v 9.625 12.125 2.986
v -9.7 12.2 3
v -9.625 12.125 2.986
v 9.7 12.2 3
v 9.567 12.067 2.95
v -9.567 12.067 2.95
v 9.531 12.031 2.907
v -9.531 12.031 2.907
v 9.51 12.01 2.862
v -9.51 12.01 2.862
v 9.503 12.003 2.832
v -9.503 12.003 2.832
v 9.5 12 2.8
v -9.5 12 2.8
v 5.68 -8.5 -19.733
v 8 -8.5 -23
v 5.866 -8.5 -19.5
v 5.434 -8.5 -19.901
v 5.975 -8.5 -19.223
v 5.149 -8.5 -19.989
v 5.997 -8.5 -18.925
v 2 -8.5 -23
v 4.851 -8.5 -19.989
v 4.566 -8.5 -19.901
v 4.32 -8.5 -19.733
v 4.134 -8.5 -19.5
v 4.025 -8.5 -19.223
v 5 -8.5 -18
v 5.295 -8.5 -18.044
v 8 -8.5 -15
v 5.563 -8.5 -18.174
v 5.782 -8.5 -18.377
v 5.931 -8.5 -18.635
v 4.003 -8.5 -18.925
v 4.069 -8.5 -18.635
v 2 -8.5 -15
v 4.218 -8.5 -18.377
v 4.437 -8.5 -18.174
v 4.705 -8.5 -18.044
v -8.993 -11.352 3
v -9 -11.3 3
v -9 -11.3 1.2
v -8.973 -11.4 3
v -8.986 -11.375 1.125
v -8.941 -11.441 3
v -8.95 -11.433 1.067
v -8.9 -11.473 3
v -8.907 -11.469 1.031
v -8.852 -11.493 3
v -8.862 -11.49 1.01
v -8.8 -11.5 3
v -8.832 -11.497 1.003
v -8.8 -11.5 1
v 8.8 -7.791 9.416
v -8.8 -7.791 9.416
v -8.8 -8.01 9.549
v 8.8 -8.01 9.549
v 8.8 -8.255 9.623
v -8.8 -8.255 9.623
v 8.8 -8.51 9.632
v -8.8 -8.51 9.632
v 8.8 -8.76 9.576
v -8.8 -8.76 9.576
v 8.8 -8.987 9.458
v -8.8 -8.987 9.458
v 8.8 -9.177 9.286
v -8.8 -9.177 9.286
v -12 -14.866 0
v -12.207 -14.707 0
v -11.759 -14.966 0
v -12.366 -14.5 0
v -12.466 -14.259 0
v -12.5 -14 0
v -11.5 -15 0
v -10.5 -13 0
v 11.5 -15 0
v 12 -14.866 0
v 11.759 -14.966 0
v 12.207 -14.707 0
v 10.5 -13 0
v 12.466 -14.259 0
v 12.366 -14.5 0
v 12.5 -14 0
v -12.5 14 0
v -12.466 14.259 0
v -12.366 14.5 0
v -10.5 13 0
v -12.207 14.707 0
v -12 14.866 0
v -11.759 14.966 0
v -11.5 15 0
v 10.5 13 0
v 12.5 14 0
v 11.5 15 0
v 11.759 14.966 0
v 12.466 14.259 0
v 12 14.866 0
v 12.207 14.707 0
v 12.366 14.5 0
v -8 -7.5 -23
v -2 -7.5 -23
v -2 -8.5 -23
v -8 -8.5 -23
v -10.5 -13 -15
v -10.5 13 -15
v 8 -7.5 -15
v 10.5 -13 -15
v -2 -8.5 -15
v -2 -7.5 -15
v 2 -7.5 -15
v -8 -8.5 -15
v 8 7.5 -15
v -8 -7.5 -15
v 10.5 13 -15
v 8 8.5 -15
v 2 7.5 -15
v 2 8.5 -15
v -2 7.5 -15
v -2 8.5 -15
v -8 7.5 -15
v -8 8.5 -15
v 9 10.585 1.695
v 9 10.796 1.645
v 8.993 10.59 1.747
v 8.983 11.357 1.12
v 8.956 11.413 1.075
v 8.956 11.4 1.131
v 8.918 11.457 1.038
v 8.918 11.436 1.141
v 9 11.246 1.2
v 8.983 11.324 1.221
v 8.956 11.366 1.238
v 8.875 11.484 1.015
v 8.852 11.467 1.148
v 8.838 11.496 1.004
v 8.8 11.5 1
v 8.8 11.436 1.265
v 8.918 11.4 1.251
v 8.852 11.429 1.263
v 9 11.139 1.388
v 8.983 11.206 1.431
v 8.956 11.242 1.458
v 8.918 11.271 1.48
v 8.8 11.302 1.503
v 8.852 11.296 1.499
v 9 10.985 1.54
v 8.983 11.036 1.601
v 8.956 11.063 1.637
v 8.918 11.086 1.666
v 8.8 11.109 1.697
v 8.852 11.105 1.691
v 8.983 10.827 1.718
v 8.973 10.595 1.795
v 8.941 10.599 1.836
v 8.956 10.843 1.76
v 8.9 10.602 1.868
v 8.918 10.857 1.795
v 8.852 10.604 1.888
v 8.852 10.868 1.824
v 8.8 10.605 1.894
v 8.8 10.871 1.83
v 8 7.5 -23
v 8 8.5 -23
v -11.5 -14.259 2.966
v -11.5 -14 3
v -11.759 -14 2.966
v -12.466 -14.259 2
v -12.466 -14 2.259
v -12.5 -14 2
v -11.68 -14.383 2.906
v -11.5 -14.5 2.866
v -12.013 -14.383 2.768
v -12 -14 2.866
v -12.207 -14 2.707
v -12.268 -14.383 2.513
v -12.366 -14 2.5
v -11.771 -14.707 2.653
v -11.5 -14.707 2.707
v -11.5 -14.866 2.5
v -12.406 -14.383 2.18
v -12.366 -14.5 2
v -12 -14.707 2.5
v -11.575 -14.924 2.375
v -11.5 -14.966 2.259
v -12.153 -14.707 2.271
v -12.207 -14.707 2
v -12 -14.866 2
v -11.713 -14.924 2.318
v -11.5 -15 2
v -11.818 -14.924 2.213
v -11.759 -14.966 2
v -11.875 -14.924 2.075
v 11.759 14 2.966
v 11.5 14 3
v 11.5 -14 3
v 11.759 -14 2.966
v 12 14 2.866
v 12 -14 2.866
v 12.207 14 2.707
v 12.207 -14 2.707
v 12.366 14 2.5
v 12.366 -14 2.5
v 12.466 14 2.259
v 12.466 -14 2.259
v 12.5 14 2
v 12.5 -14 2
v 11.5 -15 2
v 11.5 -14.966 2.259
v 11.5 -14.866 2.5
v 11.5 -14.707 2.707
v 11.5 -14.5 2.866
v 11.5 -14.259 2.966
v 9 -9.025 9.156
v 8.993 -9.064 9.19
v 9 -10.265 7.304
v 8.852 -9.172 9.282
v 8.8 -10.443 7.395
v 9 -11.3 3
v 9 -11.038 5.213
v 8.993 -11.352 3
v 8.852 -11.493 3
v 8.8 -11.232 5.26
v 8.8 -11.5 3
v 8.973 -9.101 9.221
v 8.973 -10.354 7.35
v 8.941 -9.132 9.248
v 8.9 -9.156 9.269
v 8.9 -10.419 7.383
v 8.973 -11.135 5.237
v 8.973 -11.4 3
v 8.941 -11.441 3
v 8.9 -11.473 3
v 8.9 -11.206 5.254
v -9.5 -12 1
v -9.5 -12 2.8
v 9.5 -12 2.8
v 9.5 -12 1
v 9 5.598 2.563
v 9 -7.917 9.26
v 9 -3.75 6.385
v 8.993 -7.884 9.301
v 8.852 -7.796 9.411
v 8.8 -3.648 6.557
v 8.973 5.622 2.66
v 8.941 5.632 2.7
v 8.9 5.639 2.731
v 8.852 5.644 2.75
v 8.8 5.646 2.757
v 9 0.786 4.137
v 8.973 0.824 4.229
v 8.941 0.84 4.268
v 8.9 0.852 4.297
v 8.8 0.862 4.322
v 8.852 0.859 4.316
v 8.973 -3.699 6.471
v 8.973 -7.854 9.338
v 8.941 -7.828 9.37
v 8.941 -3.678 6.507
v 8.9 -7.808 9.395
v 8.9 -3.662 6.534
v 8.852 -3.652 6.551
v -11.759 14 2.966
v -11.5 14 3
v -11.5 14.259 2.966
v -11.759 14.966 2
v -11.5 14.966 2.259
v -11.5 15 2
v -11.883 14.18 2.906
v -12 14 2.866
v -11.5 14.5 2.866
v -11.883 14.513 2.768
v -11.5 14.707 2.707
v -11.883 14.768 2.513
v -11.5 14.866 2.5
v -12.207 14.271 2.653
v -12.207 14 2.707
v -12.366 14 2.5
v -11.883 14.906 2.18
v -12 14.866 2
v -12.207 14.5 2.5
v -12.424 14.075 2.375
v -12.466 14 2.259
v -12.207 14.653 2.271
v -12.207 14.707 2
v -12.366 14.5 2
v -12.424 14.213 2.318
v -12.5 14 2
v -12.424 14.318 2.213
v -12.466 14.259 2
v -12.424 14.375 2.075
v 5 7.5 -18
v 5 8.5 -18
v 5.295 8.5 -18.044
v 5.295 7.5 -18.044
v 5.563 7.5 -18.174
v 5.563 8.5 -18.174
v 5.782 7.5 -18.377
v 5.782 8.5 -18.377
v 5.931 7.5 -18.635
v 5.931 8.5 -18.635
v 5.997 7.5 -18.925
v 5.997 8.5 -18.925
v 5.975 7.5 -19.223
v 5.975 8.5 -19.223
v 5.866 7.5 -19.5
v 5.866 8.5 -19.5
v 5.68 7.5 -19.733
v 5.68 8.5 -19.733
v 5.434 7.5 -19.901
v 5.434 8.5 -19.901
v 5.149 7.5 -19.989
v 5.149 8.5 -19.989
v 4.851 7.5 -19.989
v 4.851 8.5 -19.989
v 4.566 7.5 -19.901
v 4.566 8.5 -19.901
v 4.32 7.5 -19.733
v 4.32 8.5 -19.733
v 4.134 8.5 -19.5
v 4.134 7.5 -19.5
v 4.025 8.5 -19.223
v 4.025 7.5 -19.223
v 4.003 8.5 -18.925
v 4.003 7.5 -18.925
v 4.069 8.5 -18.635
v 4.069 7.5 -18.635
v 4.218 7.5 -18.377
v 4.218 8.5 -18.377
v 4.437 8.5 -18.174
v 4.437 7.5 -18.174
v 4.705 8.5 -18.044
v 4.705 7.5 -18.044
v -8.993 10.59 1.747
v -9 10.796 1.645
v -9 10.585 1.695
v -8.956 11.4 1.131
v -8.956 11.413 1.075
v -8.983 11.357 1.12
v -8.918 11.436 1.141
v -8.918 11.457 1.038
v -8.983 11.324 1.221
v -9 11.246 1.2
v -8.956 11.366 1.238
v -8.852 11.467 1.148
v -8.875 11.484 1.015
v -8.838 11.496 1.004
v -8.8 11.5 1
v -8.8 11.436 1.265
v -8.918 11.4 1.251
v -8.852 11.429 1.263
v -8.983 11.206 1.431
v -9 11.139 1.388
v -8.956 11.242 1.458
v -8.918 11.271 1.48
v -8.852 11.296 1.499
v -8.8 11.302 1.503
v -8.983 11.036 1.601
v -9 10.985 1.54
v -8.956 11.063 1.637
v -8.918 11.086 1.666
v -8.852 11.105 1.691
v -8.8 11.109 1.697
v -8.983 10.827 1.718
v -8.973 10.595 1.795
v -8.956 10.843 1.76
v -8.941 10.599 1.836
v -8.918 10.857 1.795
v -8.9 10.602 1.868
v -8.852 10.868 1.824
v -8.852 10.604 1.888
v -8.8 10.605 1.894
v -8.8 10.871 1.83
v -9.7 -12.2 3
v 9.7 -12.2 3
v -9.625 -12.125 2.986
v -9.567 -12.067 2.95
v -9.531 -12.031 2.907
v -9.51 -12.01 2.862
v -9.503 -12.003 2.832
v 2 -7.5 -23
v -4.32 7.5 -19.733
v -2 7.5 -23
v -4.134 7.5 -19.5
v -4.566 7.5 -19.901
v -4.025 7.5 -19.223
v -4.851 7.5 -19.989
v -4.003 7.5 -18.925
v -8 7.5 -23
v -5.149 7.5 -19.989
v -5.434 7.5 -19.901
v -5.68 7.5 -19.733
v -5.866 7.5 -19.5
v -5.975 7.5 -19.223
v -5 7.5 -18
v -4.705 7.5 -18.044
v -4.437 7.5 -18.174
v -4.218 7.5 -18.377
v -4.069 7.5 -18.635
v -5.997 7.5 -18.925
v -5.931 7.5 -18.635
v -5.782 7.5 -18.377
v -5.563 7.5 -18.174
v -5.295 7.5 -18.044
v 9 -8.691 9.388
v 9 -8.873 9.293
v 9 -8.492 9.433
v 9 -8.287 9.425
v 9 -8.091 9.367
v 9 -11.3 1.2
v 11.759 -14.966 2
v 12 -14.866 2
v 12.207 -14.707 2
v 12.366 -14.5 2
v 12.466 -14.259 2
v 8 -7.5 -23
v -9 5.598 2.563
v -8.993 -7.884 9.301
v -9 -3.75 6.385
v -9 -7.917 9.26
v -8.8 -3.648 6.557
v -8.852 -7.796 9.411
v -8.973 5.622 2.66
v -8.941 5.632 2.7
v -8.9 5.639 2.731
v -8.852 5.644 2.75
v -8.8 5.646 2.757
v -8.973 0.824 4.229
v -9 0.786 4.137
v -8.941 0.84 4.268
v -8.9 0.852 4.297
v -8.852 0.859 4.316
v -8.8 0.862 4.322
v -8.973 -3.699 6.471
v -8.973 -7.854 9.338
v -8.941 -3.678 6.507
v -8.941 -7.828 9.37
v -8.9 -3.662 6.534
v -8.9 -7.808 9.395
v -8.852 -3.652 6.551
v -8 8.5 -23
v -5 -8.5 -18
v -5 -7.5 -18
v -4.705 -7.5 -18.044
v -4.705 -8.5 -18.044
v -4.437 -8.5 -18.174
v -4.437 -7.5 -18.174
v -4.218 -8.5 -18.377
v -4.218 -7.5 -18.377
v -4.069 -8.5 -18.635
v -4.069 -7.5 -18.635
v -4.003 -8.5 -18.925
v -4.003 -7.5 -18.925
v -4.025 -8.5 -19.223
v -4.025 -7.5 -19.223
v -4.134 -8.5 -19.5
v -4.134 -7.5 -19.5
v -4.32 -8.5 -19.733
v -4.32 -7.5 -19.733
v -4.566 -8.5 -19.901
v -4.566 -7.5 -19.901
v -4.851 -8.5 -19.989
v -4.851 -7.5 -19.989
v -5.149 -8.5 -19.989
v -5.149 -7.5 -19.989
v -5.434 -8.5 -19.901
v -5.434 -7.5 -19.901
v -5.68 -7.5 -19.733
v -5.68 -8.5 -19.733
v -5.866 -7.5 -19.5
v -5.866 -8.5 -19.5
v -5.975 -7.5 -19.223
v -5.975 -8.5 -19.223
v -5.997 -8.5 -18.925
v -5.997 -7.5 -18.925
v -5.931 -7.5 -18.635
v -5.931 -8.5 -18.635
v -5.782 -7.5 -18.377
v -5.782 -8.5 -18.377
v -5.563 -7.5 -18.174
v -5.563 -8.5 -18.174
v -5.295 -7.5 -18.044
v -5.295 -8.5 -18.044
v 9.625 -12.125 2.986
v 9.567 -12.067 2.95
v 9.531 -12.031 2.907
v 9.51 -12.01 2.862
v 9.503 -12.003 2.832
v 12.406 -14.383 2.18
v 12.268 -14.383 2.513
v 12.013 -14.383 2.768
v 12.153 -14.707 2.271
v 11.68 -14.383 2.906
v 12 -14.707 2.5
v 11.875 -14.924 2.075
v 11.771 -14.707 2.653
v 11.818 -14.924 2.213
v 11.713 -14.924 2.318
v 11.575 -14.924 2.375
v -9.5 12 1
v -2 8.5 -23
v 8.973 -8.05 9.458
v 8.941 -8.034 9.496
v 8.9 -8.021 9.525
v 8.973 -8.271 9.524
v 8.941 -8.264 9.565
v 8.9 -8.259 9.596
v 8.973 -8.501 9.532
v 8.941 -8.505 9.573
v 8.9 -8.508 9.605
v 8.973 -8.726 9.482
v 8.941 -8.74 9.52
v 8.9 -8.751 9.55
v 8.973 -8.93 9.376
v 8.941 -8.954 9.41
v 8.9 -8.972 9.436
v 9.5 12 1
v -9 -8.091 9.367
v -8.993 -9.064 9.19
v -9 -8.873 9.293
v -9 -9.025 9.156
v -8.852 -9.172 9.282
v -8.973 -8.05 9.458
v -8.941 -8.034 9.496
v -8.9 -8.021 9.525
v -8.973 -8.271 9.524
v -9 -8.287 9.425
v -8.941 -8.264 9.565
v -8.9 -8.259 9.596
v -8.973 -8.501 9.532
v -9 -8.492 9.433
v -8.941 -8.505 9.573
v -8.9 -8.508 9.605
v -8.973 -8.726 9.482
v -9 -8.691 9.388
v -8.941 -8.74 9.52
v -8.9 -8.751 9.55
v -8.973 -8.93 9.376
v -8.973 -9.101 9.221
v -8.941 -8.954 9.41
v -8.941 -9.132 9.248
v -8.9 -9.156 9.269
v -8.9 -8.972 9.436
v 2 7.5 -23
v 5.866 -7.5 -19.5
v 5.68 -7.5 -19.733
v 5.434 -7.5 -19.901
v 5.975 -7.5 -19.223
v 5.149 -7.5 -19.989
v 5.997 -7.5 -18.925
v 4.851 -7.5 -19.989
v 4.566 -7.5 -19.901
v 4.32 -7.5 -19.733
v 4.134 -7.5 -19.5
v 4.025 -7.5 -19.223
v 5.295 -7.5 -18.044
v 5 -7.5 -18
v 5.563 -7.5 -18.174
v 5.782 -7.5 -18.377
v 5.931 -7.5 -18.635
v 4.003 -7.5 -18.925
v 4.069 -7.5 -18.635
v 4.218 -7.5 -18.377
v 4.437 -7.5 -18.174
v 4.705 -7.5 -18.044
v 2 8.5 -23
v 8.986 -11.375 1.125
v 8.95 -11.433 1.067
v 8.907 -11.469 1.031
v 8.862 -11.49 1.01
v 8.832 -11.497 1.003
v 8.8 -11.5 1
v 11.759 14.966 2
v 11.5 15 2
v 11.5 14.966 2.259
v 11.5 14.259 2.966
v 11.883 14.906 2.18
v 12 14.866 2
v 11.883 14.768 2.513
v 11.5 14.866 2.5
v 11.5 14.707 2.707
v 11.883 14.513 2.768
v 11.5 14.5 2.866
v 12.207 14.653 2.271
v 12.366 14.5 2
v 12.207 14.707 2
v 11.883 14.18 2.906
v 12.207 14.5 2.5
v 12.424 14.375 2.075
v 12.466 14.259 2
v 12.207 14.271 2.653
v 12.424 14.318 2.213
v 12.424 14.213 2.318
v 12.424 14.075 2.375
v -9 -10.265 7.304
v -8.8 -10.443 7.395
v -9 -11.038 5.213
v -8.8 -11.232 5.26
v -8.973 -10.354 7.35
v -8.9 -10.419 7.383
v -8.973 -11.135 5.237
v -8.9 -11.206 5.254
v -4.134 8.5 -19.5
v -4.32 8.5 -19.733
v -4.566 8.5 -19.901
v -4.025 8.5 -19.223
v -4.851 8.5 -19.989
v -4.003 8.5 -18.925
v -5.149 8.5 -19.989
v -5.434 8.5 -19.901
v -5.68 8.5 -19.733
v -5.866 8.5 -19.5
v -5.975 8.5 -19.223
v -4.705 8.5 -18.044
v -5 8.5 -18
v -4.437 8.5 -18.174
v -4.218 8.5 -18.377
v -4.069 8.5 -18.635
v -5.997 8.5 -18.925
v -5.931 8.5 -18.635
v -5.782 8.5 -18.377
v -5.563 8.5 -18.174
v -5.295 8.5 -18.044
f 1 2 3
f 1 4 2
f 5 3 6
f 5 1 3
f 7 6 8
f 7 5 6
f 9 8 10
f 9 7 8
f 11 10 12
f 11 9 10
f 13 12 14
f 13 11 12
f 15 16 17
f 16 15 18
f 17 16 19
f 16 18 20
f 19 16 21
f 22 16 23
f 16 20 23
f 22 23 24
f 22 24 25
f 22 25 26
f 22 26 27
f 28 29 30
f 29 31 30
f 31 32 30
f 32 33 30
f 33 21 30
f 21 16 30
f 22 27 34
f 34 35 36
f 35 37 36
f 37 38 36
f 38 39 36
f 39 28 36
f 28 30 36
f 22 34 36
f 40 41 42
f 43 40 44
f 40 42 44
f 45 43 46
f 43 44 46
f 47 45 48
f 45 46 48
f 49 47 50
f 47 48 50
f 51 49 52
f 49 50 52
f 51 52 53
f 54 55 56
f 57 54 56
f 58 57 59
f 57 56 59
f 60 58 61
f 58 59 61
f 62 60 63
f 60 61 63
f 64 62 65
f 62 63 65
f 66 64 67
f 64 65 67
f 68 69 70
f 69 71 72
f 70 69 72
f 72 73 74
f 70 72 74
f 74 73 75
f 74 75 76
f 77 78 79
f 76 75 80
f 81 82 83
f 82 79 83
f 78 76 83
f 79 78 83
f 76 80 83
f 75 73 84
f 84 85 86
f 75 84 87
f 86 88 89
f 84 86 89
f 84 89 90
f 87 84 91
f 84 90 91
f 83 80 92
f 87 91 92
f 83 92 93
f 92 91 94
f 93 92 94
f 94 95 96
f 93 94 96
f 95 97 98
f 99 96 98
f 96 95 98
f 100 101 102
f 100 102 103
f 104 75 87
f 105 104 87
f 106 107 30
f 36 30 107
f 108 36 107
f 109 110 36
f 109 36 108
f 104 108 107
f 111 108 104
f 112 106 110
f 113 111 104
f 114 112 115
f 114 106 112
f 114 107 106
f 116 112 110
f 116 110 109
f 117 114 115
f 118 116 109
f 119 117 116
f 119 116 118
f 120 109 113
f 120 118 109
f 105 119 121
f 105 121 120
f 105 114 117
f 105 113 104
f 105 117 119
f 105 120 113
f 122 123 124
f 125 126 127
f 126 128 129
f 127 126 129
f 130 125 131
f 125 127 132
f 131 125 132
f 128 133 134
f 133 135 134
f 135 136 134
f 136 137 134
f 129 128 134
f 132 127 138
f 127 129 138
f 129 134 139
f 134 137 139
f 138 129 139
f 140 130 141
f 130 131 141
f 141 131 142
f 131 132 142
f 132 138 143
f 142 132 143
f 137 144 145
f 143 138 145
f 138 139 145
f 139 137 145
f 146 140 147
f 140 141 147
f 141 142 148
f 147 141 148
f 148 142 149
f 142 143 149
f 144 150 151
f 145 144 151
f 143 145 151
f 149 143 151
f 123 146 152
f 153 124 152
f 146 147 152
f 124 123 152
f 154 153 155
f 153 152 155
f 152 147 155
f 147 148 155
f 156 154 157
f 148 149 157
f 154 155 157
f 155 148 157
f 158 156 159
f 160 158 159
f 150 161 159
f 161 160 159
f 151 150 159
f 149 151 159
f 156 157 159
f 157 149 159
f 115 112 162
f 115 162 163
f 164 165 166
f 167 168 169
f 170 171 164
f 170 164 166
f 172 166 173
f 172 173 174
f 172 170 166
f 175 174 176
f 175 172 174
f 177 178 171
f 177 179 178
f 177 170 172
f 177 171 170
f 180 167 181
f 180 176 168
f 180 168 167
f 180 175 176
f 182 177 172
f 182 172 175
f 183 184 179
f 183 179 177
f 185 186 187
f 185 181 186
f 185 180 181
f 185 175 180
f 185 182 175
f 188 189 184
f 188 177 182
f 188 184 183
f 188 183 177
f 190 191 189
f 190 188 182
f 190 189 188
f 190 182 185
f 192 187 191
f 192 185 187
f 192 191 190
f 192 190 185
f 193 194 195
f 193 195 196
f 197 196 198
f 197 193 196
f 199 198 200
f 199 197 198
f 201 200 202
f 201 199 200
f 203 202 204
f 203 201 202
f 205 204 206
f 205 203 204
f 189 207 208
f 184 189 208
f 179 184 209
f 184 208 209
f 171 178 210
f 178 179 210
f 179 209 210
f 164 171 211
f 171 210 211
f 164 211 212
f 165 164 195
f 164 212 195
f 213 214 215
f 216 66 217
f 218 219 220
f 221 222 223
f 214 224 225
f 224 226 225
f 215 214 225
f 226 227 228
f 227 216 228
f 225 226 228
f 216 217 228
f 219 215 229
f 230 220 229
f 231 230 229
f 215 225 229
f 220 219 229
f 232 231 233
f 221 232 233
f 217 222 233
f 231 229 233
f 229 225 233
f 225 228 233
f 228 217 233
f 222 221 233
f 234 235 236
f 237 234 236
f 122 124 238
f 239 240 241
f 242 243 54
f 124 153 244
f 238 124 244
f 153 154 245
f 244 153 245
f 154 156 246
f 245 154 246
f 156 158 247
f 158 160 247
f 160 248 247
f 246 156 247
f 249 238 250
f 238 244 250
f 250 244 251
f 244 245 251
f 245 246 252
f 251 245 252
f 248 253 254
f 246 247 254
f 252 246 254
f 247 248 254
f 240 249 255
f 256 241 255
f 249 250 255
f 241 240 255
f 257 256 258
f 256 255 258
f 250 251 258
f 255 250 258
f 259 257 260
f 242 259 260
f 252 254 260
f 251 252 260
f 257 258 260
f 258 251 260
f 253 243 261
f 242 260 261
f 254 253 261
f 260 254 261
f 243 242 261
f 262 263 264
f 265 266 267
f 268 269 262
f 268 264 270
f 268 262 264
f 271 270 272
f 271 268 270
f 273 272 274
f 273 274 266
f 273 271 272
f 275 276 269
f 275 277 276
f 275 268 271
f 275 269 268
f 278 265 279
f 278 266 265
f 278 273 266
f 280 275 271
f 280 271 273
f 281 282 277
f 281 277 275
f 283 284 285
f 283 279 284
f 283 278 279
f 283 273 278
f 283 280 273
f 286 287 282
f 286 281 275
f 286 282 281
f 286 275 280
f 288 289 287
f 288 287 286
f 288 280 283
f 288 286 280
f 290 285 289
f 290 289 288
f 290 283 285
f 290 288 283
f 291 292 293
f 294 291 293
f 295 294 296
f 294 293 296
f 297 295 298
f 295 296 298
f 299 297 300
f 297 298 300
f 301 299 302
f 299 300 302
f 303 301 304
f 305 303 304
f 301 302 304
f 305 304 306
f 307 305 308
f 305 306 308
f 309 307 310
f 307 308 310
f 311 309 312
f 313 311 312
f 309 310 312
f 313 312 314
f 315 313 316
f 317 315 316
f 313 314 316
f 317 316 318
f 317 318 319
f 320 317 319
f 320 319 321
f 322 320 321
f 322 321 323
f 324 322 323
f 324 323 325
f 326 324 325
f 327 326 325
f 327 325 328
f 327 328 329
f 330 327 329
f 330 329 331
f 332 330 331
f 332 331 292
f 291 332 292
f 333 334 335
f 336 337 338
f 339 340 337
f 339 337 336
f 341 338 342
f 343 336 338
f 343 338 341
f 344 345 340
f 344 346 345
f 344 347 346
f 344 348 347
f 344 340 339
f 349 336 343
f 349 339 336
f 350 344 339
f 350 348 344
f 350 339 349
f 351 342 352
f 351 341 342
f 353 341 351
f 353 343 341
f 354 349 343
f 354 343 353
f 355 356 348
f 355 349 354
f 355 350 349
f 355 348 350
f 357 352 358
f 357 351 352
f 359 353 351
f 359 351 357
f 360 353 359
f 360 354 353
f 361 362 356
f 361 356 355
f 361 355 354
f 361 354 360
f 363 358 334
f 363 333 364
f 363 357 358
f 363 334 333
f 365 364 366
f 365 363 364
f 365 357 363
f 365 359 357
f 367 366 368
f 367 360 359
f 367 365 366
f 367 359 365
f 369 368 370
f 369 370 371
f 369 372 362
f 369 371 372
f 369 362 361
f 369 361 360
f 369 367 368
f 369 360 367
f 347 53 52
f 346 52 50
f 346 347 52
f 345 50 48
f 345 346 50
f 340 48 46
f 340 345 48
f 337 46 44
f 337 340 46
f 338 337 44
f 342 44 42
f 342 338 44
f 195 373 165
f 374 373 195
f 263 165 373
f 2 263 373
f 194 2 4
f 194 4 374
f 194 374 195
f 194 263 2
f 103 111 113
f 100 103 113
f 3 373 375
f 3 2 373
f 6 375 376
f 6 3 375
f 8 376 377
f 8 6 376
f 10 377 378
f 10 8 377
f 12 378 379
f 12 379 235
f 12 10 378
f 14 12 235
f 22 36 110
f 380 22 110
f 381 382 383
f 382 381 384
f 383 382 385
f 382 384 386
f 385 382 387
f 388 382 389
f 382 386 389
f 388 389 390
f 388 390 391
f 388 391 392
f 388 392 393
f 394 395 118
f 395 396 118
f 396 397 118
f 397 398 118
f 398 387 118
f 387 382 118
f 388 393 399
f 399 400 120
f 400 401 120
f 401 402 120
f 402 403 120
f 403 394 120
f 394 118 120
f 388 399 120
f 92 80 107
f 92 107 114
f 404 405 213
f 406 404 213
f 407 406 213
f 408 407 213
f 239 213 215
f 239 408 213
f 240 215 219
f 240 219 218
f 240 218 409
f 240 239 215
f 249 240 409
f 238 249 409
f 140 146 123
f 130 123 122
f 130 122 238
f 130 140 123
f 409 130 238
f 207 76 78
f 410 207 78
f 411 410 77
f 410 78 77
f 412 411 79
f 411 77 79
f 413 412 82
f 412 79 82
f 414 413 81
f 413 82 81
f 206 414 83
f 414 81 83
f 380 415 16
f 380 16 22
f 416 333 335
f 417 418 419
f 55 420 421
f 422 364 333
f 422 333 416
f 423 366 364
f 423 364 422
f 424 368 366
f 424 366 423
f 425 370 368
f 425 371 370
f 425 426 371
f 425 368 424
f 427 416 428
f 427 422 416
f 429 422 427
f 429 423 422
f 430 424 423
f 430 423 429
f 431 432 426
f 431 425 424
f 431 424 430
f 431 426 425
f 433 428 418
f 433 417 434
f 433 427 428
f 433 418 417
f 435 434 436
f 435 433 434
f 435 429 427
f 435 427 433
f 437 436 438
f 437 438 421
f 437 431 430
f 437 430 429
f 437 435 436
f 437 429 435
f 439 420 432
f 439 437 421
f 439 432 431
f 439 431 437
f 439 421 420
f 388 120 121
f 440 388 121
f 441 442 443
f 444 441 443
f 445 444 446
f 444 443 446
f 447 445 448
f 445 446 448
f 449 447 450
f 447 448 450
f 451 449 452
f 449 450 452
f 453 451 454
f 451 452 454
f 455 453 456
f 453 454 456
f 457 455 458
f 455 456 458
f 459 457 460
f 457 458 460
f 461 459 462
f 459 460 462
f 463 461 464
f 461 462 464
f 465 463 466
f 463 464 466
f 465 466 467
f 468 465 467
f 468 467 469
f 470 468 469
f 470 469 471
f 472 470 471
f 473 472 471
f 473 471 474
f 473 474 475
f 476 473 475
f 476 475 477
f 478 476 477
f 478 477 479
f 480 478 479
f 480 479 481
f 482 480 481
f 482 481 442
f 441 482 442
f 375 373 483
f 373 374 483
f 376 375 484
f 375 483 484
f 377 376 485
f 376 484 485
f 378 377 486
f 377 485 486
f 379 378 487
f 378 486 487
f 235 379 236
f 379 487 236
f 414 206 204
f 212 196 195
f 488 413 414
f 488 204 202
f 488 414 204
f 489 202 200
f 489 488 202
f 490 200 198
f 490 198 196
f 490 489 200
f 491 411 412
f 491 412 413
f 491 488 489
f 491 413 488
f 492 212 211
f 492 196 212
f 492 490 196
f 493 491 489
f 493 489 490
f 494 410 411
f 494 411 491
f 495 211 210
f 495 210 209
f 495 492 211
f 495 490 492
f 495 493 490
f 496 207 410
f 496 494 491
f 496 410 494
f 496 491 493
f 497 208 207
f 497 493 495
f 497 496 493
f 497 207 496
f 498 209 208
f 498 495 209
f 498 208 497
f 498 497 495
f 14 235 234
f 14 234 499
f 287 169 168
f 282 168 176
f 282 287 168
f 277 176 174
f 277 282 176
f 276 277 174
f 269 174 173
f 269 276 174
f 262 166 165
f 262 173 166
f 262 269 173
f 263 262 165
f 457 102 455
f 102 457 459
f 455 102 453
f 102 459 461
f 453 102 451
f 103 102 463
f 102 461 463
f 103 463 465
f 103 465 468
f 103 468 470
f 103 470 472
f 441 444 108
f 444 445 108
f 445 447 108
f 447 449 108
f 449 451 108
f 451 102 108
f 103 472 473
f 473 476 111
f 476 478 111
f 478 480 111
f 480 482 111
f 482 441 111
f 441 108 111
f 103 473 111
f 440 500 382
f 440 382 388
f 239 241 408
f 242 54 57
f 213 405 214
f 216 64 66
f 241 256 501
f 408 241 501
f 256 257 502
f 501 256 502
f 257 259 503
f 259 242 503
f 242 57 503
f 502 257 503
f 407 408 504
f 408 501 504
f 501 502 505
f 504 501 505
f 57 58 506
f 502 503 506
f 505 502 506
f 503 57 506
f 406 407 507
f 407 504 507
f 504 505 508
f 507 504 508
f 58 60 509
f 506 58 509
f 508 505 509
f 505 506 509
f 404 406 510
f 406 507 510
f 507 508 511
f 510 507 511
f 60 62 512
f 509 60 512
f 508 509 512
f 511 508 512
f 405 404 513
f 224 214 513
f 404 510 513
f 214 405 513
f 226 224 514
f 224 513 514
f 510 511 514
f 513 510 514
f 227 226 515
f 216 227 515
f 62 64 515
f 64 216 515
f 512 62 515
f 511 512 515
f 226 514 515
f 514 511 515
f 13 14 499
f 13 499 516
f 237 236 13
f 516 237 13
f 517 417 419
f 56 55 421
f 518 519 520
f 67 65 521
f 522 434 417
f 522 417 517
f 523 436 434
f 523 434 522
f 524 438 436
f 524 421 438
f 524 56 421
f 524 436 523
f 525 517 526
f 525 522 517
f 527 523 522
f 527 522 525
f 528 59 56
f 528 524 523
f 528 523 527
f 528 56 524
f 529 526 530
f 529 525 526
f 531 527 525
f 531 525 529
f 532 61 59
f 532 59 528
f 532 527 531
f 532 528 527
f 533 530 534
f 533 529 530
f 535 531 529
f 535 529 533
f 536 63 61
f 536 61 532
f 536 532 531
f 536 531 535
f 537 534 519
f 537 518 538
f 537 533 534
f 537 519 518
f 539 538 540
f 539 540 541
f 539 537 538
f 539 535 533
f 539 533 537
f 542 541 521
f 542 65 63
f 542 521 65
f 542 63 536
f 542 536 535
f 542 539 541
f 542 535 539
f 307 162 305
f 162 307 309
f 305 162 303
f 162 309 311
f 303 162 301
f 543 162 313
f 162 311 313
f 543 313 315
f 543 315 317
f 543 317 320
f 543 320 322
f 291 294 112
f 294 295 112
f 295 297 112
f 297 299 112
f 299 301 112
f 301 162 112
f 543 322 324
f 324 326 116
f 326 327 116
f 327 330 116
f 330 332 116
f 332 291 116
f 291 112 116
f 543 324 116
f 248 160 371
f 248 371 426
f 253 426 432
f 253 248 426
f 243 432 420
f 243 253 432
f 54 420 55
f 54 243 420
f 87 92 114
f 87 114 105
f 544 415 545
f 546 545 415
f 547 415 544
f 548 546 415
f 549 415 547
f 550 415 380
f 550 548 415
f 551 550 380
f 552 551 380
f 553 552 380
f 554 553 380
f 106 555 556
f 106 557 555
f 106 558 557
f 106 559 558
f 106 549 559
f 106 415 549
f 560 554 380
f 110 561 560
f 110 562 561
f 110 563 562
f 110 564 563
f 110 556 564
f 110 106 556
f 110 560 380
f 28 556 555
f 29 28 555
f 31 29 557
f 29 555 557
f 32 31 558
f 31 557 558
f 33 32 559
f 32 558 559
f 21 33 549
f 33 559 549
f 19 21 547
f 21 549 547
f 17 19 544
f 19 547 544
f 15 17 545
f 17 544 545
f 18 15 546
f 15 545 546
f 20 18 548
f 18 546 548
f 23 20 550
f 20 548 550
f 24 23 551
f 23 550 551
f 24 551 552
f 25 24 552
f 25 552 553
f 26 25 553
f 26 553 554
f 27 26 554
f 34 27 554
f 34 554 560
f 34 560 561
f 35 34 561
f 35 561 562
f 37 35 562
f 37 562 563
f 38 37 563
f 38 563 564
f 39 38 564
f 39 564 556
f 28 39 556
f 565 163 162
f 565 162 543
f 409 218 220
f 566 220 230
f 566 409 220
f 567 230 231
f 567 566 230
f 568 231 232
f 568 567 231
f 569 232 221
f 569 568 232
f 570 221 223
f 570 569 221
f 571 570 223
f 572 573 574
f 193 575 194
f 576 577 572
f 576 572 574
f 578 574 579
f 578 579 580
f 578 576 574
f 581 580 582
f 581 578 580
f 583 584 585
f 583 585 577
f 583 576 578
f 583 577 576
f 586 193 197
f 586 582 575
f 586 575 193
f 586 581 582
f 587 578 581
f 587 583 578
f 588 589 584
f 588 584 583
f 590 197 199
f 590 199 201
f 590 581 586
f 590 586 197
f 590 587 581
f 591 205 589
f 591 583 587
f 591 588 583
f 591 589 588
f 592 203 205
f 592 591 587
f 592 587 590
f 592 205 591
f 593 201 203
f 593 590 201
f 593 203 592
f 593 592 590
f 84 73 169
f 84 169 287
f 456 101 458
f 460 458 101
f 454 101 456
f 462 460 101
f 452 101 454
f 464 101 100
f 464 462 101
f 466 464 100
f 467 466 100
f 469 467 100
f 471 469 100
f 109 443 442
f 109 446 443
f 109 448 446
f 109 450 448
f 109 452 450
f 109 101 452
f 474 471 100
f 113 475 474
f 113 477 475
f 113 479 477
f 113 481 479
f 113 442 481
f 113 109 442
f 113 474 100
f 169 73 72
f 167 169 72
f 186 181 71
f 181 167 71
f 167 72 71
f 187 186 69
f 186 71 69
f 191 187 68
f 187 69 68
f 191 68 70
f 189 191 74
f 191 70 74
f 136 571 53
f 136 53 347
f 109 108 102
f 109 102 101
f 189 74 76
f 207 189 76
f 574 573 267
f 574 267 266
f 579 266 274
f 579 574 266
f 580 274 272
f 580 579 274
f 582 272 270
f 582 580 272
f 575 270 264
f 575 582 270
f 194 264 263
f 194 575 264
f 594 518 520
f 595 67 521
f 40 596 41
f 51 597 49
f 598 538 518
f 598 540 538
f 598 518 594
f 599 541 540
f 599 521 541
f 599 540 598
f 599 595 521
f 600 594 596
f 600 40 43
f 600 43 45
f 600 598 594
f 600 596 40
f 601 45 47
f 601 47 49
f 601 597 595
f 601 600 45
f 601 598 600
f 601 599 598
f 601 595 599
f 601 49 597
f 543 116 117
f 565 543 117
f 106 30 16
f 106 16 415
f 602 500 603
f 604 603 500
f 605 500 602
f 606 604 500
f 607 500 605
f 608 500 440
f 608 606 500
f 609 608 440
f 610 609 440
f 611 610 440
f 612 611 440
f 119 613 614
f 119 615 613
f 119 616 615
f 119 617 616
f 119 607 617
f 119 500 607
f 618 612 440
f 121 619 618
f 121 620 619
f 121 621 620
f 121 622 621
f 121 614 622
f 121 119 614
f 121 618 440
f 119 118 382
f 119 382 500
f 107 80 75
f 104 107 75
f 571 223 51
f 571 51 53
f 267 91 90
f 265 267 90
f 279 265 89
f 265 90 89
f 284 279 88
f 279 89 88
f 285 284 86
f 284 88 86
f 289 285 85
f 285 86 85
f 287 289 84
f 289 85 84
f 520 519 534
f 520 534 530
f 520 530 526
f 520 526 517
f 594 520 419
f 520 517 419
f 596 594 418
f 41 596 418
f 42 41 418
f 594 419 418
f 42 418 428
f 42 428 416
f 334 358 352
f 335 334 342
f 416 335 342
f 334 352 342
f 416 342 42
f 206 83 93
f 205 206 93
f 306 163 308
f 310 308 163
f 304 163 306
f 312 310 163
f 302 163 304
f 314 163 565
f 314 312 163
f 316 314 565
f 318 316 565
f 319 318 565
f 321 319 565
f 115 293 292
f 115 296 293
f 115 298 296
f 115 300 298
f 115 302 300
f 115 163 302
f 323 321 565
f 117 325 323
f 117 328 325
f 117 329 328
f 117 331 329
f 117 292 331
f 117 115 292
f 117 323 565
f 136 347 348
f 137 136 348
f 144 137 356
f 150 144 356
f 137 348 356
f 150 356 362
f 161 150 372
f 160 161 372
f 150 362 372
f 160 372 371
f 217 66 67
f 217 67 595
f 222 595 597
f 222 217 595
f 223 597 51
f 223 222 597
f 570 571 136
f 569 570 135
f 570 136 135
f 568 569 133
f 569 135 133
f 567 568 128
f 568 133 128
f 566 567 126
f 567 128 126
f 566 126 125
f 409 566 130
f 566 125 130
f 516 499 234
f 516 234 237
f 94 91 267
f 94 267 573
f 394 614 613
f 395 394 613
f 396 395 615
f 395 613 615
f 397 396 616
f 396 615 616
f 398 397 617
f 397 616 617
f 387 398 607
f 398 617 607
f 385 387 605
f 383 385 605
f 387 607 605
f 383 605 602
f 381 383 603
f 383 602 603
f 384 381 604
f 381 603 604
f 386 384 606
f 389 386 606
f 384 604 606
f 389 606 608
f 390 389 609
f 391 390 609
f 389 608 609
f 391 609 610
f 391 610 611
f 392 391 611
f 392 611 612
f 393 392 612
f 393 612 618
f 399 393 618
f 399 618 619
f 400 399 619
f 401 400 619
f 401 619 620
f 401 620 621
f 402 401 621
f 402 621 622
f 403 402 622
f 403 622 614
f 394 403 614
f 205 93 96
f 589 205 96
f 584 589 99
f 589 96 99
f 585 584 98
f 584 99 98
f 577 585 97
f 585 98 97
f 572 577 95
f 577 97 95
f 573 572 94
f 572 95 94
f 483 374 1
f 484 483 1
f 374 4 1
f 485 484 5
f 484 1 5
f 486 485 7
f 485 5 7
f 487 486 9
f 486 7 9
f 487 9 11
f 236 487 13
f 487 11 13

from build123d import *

# Parameters (mm, degrees)
ESQUISSE1_W             = 25
ESQUISSE1_H             = 30
BOSS_EXTRU_1_DEPTH      = 3
ESQUISSE2_W             = 21
ESQUISSE2_H             = 26
BOSS_EXTRU_2_DEPTH      = 15
CONG_1_R                = 1
CONG_2_R                = 1
ESQUISSE3_W             = 19
ESQUISSE3_H             = 24
ENL_V_MAT_EXTRU_1_DEPTH = 2
CONG_3_R                = 0.2
BOSS_EXTRU_4_DEPTH      = 9
CONG_6_R                = 1
CONG_7_R                = 0.2
ESQUISSE6_W             = 6
ESQUISSE6_H             = 1
BOSS_EXTRU_5_DEPTH      = 8
ESQUISSE7_R             = 1
ENL_V_MAT_EXTRU_2_DEPTH = 36.178118199


with BuildPart() as part:
    # Esquisse1 → Boss.-Extru.1 (new body)
    with BuildSketch(Plane.XY):
        Rectangle(ESQUISSE1_W, ESQUISSE1_H)
    extrude(amount=BOSS_EXTRU_1_DEPTH)

    # Esquisse2 → Boss.-Extru.2 (add)
    with BuildSketch(Plane(origin=(0, 0, 0), x_dir=(-1, 0, 0), z_dir=(0, 0, -1))):
        Rectangle(ESQUISSE2_W, ESQUISSE2_H)
    extrude(amount=BOSS_EXTRU_2_DEPTH)

    # Congé1
    cong_1_edges = [part.edges().sort_by_distance(p)[0] for p in [
        (12.5, 0, 3),
        (0, 15, 3),
        (-12.5, 0, 3),
        (0, -15, 3),
    ]]
    fillet(cong_1_edges, radius=CONG_1_R)

    # Congé2
    # the kernel refuses this fillet: 1 mm, written as the material it takes off along each edge
    with BuildSketch(Plane(origin=(11.5, -14, 2), x_dir=(1, 0, 0), z_dir=(0, -1, 0))) as cong_2_piece_1_section:
        Polygon((0, 0), (CONG_2_R, 0), (CONG_2_R, CONG_2_R), (0, CONG_2_R), align=None)
    cong_2_piece_1 = extrude(amount=CONG_2_R, mode=Mode.PRIVATE)
    cong_2_piece_1 = cong_2_piece_1 - Plane(origin=(11.5, -14, 2), x_dir=(-0.7071067811865475, 0, -0.7071067811865475), z_dir=(0, -1, 0)) * Sphere(CONG_2_R, mode=Mode.PRIVATE)
    add(cong_2_piece_1, mode=Mode.SUBTRACT)
    with BuildSketch(Plane(origin=(-11.5, -14, 2), x_dir=(-1, 0, 0), z_dir=(0, -1, 0))) as cong_2_piece_2_section:
        Polygon((0, 0), (CONG_2_R, 0), (CONG_2_R, -CONG_2_R), (0, -CONG_2_R), align=None)
    cong_2_piece_2 = extrude(amount=CONG_2_R, mode=Mode.PRIVATE)
    cong_2_piece_2 = cong_2_piece_2 - Plane(origin=(-11.5, -14, 2), x_dir=(0.7071067811865475, 0, -0.7071067811865475), z_dir=(0, -1, 0)) * Sphere(CONG_2_R, mode=Mode.PRIVATE)
    add(cong_2_piece_2, mode=Mode.SUBTRACT)
    with BuildSketch(Plane(origin=(11.5, 14, 2), x_dir=(0, 1, 0), z_dir=(1, 0, 0))) as cong_2_piece_3_section:
        Polygon((0, 0), (CONG_2_R, 0), (CONG_2_R, CONG_2_R), (0, CONG_2_R), align=None)
    cong_2_piece_3 = extrude(amount=CONG_2_R, mode=Mode.PRIVATE)
    cong_2_piece_3 = cong_2_piece_3 - Plane(origin=(11.5, 14, 2), x_dir=(0, -0.7071067811865475, -0.7071067811865475), z_dir=(1, 0, 0)) * Sphere(CONG_2_R, mode=Mode.PRIVATE)
    add(cong_2_piece_3, mode=Mode.SUBTRACT)
    with BuildSketch(Plane(origin=(-11.5, 14, 2), x_dir=(0, 1, 0), z_dir=(-1, 0, 0))) as cong_2_piece_4_section:
        Polygon((0, 0), (CONG_2_R, 0), (CONG_2_R, -CONG_2_R), (0, -CONG_2_R), align=None)
    cong_2_piece_4 = extrude(amount=CONG_2_R, mode=Mode.PRIVATE)
    cong_2_piece_4 = cong_2_piece_4 - Plane(origin=(-11.5, 14, 2), x_dir=(0, -0.7071067811865475, -0.7071067811865475), z_dir=(-1, 0, 0)) * Sphere(CONG_2_R, mode=Mode.PRIVATE)
    add(cong_2_piece_4, mode=Mode.SUBTRACT)
    with BuildSketch(Plane(origin=(-12.5, 15, -2.5), x_dir=(0, -1, 0), z_dir=(0, 0, 1)), Plane(origin=(-12.5, -15, -2.5), x_dir=(1, 0, 0), z_dir=(0, 0, 1))) as cong_2_piece_5:
        with BuildLine():
            CenterArc((CONG_2_R, CONG_2_R), CONG_2_R, 180, 90)
            Line((0, CONG_2_R), (0, 0))
            Line((0, 0), (CONG_2_R, 0))
        make_face()
    extrude(amount=4.5, mode=Mode.SUBTRACT)
    with BuildSketch(Plane(origin=(12.5, 15, -2.5), x_dir=(0, -1, 0), z_dir=(0, 0, 1)), Plane(origin=(12.5, -15, -2.5), x_dir=(-1, 0, 0), z_dir=(0, 0, 1))) as cong_2_piece_6:
        with BuildLine():
            CenterArc((CONG_2_R, -CONG_2_R), CONG_2_R, 90, 90)
            Line((0, -CONG_2_R), (0, 0))
            Line((0, 0), (CONG_2_R, 0))
        make_face()
    extrude(amount=4.5, mode=Mode.SUBTRACT)

    # Esquisse3 → Enlèv. mat.-Extru.1 (cut)
    with BuildSketch(Plane.XY.offset(3)):
        Rectangle(ESQUISSE3_W, ESQUISSE3_H)
    extrude(amount=-ENL_V_MAT_EXTRU_1_DEPTH, mode=Mode.SUBTRACT)

    # Congé3
    cong_3_edges = [part.edges().sort_by_distance(p)[0] for p in [
        (0, -12, 3),
        (9.5, 0, 3),
        (0, 12, 3),
        (-9.5, 0, 3),
    ]]
    fillet(cong_3_edges, radius=CONG_3_R)

    # Esquisse6 → Boss.-Extru.5 (add)
    with BuildSketch(Plane(origin=(0, 0, -15), x_dir=(-1, 0, 0), z_dir=(0, 0, -1))):
        with Locations((-5, 8)):
            Rectangle(ESQUISSE6_W, ESQUISSE6_H)
        with Locations((5, 8)):
            Rectangle(ESQUISSE6_W, ESQUISSE6_H)
        with Locations((5, -8)):
            Rectangle(ESQUISSE6_W, ESQUISSE6_H)
        with Locations((-5, -8)):
            Rectangle(ESQUISSE6_W, ESQUISSE6_H)
    extrude(amount=BOSS_EXTRU_5_DEPTH)

    # Esquisse7 → Enlèv. mat.-Extru.2 (cut, through all)
    with BuildSketch(Plane(origin=(0, 8.5, 0), x_dir=(1, 0, 0), z_dir=(0, 1, 0))):
        with Locations(Location((5, 19, 0), (0, 0, 270))):
            Circle(ESQUISSE7_R)
        with Locations(Location((-5, 19, 0), (0, 0, 270))):
            Circle(ESQUISSE7_R)
    extrude(amount=-ENL_V_MAT_EXTRU_2_DEPTH, mode=Mode.SUBTRACT)


with BuildPart() as body_2:
    # Esquisse5 → Boss.-Extru.4 (new, symmetric)
    with BuildSketch(Plane(origin=(0, 0, 0), x_dir=(0, 0, -1), z_dir=(1, 0, 0))):
        with BuildLine():
            Line((-1, 11.5), (-1.81585961, 11.5))
            ThreePointArc((-1.81585961, 11.5), (-4.325737909, 0.85255597), (-10, -8.5))
            ThreePointArc((-10, -8.5), (-6.807886553, -10.718401957), (-3, -11.5))
            Line((-3, -11.5), (-1, -11.5))
            Line((-1, -11.5), (-1, 11.5))
        make_face()
    extrude(amount=BOSS_EXTRU_4_DEPTH, both=True)

    # Congé6
    # the kernel refuses this fillet: 1 mm, written as the material it takes off along each edge
    with BuildSketch(Plane(origin=(-11.245669282, 11.5, 1.81585961), x_dir=(0, 0, -1), z_dir=(1, 0, 0))) as cong_6_piece_1:
        with BuildLine():
            CenterArc((0.916558206, -0.994916978), CONG_6_R, 95.779400144, 78.476879522)
            Line((-0.078421287, -0.894837966), (-0.098320877, -0.892836386))
            ThreePointArc((-0.098320877, -0.892836386), (-0.056263433, -0.445924521), (-0.019944402, 0.001490244))
            Line((-0.019944402, 0.001490244), (0, 0.02))
            ThreePointArc((0, 0.02), (0.407929805, 0.02), (0.813845638, 0.01989834))
            Line((0.813845638, 0.01989834), (0.81585961, 0))
        make_face()
    extrude(amount=22.491338564, mode=Mode.SUBTRACT)
    with BuildSketch(Plane(origin=(-11.458601046, -8.5, 10), x_dir=(0, -0.6881193570157783, -0.7255975127439398), z_dir=(1, 0, 0))) as cong_6_piece_2:
        with BuildLine():
            CenterArc((0.93257281, 0.998705405), CONG_6_R, 184.74826644, 88.167491153)
            Line((-0.063995197, 0.91592735), (-0.083926557, 0.914271789))
            ThreePointArc((-0.083926557, 0.914271789), (-0.048945373, 0.456779546), (-0.019967929, -0.001132174))
            Line((-0.019967929, -0.001132174), (-0.001017352, -0.019974108))
            ThreePointArc((-0.001017352, -0.019974108), (0.491720209, -0.032514416), (0.98445777, -0.019974108))
            Line((0.98445777, -0.019974108), (0.983440418, 0))
        make_face()
    extrude(amount=22.917202091, mode=Mode.SUBTRACT)

    # Congé7
    cong_7_edges = [body_2.edges().sort_by_distance(p)[0] for p in [
        (9, -10.900597474, 6.350994697),
        (-9, 0.861762657, 4.321971995),
        (9, 0.861762657, 4.321971995),
        (-9, -8.510312958, 9.63174172),
        (-9, 11.211969601, 1.606628319),
        (9, -8.510312958, 9.63174172),
        (9, 11.211969601, 1.606628319),
        (9, -11.5, 2),
        (-9, -10.900597474, 6.350994697),
        (-9, 0, 1),
        (-9, -11.5, 2),
        (9, 0, 1),
    ]]
    fillet(cong_7_edges, radius=CONG_7_R)


solid = Compound([part.part, body_2.part])
